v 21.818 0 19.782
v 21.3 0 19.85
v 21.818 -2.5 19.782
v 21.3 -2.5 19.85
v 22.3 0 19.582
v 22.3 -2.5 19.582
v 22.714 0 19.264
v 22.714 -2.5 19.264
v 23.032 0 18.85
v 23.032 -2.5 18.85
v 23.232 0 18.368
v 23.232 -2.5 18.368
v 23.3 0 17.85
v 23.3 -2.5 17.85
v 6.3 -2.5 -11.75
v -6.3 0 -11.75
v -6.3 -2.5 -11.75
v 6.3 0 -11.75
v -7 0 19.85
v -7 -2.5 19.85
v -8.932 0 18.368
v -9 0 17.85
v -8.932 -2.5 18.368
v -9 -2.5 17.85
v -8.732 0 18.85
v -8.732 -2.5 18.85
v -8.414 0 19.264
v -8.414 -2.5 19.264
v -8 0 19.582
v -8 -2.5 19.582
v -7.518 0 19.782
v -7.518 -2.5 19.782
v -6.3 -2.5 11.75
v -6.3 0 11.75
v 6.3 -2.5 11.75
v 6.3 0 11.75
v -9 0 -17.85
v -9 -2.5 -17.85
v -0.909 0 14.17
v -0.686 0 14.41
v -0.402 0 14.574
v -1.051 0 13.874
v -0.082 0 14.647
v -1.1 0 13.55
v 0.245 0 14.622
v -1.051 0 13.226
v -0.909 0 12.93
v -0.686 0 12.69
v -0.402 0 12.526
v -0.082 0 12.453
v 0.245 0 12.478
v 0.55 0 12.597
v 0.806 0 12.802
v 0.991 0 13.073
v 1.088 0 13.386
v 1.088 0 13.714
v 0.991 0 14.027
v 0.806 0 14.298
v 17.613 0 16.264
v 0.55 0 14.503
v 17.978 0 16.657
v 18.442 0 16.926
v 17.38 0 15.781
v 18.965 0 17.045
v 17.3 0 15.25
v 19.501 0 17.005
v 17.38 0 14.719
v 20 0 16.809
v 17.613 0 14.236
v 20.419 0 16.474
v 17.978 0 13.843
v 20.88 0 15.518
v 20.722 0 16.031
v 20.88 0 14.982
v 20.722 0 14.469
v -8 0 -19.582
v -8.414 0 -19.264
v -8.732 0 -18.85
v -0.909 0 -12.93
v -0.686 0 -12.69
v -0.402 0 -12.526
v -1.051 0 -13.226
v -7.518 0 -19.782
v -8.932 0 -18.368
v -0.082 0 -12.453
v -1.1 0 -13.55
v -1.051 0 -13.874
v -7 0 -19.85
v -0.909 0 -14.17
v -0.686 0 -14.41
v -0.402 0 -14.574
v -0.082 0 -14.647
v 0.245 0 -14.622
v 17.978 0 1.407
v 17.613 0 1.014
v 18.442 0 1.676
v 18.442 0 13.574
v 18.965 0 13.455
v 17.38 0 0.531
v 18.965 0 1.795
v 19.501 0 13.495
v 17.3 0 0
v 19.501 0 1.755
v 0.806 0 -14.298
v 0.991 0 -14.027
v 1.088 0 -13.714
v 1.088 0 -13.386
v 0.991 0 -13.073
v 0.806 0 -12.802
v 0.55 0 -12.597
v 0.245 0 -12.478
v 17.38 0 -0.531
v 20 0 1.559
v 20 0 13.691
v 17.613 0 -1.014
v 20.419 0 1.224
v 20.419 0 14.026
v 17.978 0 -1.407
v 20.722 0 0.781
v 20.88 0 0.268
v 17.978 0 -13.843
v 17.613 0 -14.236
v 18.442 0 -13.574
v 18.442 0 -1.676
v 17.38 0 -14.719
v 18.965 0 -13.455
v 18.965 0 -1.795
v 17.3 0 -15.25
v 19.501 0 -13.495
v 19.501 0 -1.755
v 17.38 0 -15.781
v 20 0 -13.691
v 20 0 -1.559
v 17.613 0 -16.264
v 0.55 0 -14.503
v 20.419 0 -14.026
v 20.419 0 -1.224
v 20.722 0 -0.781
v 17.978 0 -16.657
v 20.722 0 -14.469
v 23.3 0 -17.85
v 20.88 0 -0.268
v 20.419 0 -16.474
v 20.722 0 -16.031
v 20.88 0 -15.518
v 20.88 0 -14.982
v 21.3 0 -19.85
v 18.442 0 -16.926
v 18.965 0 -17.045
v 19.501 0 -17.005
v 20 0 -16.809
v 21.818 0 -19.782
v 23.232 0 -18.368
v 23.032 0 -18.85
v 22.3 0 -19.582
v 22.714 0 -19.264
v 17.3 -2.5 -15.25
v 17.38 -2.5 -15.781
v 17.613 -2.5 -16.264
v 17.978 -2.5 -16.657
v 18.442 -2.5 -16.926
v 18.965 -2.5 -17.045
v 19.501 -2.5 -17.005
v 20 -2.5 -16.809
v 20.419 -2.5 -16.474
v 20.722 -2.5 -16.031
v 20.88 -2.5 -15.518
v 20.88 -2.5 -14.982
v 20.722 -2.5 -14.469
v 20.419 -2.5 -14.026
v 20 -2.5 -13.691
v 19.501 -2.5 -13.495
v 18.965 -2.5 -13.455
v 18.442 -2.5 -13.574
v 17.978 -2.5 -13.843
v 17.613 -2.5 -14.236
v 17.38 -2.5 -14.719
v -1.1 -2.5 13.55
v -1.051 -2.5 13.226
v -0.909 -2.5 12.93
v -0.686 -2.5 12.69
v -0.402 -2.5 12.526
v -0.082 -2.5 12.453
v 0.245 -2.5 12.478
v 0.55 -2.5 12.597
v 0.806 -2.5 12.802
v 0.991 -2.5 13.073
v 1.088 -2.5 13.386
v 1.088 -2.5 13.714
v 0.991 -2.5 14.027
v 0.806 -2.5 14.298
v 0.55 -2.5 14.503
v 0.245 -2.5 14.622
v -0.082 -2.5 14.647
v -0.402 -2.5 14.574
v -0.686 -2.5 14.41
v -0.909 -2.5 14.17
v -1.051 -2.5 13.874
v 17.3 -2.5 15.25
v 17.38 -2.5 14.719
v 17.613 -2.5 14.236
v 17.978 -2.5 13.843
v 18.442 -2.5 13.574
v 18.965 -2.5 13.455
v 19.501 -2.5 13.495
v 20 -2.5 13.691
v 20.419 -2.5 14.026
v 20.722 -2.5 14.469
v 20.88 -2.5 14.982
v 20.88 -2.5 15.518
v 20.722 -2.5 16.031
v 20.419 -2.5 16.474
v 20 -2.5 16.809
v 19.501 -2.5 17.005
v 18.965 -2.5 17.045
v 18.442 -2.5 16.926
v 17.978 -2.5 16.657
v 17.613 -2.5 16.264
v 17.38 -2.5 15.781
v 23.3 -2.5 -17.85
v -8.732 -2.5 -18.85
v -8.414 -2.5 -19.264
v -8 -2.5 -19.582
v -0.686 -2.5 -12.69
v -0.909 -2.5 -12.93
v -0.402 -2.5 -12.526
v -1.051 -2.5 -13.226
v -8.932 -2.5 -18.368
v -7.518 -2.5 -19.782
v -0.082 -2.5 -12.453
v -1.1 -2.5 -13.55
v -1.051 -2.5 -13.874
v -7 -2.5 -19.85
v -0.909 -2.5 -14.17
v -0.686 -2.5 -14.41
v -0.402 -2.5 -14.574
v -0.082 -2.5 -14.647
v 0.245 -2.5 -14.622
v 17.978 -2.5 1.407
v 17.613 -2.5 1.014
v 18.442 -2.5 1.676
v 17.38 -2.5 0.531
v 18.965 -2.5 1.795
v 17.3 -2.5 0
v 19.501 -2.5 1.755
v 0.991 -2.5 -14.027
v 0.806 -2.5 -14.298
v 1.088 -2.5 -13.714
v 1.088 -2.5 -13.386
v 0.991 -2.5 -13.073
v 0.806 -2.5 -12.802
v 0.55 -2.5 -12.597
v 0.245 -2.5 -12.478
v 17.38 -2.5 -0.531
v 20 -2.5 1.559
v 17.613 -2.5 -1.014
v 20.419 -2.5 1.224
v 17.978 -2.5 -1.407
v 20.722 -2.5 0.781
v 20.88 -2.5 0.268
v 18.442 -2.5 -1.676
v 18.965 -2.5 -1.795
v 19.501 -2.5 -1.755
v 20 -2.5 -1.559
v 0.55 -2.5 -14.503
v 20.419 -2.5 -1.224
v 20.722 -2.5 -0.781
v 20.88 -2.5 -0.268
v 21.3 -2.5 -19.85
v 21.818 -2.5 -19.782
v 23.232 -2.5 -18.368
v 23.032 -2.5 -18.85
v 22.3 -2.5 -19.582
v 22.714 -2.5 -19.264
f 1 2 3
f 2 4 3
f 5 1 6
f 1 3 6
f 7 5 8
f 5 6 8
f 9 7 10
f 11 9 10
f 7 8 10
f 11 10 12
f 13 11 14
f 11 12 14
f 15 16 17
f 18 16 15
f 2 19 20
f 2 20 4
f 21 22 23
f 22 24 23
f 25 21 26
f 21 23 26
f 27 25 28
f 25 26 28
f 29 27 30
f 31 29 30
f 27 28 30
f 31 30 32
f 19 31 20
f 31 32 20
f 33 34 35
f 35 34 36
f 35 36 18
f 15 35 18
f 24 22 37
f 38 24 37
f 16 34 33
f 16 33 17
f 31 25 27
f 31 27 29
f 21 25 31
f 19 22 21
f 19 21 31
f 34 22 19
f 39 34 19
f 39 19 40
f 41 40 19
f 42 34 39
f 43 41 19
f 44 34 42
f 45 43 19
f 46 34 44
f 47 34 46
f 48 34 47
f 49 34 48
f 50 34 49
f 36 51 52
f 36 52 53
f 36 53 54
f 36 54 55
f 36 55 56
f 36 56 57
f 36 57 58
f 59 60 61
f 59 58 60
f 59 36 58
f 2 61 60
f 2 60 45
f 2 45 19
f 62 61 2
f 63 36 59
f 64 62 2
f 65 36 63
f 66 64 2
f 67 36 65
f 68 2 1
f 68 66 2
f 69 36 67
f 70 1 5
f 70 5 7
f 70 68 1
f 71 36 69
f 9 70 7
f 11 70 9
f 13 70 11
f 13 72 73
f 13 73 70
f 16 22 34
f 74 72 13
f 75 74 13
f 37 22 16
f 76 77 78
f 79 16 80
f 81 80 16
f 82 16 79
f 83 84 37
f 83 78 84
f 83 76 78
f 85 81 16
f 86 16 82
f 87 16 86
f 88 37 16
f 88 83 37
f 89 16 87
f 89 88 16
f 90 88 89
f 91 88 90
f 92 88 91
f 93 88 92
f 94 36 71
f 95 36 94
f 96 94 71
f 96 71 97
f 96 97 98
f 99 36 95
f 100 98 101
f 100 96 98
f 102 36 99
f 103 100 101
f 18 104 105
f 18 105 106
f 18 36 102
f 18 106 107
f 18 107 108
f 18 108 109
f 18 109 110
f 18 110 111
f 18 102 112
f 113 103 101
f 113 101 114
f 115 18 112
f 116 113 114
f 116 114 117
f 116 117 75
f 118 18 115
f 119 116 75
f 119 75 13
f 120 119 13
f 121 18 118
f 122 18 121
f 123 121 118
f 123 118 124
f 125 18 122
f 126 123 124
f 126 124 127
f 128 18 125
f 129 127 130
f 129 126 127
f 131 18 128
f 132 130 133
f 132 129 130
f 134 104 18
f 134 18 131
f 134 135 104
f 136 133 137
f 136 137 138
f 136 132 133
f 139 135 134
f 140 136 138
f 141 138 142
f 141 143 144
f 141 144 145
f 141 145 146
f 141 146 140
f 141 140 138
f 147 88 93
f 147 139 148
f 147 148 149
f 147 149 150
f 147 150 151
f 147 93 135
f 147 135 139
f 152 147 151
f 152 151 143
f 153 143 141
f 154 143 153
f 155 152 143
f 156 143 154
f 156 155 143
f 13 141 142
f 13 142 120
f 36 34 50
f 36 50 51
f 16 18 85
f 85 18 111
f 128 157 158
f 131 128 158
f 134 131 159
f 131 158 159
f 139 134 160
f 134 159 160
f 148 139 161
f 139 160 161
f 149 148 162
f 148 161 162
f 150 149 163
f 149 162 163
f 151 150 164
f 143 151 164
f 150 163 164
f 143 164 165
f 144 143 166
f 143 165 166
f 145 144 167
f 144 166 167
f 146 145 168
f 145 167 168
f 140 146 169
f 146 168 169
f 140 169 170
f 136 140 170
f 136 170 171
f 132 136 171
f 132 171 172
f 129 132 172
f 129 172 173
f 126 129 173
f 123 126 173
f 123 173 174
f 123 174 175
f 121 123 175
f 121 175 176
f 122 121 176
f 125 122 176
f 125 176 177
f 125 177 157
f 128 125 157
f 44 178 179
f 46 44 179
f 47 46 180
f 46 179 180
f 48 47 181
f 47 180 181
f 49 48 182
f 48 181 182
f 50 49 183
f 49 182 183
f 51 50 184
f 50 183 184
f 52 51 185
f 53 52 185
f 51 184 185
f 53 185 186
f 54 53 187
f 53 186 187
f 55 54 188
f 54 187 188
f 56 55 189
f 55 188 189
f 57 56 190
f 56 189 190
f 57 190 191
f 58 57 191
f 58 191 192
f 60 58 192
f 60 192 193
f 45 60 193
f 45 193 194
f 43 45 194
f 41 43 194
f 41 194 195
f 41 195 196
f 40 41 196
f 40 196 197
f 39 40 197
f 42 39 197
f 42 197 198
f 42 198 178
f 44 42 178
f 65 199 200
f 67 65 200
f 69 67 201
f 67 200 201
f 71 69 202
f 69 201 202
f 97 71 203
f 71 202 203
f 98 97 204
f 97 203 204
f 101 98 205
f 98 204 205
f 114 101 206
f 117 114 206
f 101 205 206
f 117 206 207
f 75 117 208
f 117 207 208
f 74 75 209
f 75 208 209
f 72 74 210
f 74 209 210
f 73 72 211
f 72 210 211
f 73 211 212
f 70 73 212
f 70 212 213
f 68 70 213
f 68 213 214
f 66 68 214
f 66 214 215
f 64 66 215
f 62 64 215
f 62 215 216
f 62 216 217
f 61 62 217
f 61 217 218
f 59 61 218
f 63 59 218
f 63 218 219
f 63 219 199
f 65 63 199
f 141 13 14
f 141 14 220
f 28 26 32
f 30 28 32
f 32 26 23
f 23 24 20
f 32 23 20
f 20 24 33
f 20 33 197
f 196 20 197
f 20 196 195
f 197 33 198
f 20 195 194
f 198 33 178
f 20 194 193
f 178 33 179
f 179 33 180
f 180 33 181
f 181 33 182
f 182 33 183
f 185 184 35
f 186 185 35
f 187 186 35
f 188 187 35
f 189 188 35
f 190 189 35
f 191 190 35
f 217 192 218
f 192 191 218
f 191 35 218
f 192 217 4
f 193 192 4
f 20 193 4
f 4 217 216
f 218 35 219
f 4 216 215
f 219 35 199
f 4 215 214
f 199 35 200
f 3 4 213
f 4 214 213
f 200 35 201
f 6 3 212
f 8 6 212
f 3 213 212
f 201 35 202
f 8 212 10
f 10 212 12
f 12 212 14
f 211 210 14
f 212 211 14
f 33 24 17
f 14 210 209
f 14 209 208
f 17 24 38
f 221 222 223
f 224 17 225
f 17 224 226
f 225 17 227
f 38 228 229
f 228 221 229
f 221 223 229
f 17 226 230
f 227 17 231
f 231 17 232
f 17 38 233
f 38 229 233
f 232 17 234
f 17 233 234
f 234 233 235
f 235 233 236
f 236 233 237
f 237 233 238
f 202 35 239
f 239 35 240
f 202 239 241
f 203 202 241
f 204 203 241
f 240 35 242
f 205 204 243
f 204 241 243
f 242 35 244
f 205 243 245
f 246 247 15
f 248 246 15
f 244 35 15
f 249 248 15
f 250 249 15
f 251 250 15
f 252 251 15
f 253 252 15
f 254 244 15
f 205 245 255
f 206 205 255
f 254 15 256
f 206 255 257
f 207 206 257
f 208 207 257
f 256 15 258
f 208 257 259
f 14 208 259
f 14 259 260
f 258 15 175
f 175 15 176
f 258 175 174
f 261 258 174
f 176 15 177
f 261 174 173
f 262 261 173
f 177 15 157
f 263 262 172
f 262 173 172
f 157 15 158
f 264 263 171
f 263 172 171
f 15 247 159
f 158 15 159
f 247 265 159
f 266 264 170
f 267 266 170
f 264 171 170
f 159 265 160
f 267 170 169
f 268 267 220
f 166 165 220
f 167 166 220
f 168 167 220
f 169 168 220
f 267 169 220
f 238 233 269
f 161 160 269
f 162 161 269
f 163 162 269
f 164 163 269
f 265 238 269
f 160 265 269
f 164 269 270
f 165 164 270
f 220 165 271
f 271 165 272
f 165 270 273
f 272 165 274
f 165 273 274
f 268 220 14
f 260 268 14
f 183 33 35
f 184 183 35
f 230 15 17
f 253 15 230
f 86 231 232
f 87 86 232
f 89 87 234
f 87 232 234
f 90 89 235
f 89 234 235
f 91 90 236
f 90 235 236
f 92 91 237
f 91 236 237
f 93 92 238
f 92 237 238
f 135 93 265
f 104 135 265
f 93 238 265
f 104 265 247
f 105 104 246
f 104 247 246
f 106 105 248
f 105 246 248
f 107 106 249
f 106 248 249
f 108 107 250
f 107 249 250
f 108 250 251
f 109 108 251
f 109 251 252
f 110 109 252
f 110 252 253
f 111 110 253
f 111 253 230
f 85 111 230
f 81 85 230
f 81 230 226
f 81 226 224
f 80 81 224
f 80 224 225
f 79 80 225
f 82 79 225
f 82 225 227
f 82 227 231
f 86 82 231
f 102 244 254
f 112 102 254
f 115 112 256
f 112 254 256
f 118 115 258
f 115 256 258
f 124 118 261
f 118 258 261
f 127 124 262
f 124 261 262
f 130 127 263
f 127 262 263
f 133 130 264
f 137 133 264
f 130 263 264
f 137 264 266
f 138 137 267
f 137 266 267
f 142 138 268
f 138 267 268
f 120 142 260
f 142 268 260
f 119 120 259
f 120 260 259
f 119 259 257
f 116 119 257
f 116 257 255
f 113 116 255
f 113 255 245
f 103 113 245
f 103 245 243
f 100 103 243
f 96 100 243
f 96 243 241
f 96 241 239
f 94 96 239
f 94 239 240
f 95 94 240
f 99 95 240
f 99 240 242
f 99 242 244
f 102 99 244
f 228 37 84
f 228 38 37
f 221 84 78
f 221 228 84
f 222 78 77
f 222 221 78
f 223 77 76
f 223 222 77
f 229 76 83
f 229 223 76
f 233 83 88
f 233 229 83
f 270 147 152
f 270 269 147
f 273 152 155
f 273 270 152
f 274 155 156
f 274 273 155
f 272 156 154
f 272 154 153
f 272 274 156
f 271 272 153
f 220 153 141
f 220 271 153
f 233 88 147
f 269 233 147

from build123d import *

# Parameters (mm, degrees)
SKETCH1_W             = 32.299999994
SKETCH1_H             = 39.7
PLATE_SIZE_DEPTH      = 2.5
SKETCH2_W             = 12.6
SKETCH2_H             = 23.5
SERVO_CLEARANCE_DEPTH = 3.5
M2_CLEARANCE_HOLE1_D  = 2.2
M3_CLEARANCE_HOLE1_D  = 3.6
CORNER_FILLET1_R      = 2


with BuildPart() as part:
    # Sketch1 → Plate Size (new body)
    with BuildSketch(Plane(origin=(0, 0, 0), x_dir=(1, 0, 0), z_dir=(0, 1, 0))):
        with Locations((7.149999997, 0)):
            Rectangle(SKETCH1_W, SKETCH1_H)
    extrude(amount=-PLATE_SIZE_DEPTH)

    # Sketch2 → Servo Clearance (cut, through all)
    with BuildSketch(Plane(origin=(0, 0, 0), x_dir=(1, 0, 0), z_dir=(0, 1, 0))):
        Rectangle(SKETCH2_W, SKETCH2_H)
    extrude(amount=-SERVO_CLEARANCE_DEPTH, mode=Mode.SUBTRACT)

    # M2 Clearance Hole1 (through all)
    with Locations(Plane(origin=(0, 0, 0), x_dir=(1, 0, 0), z_dir=(0, 1, 0))):
        with Locations((0, -13.55), (0, 13.55)):
            Hole(M2_CLEARANCE_HOLE1_D / 2)

    # M3 Clearance Hole1 (through all)
    with Locations(Plane(origin=(0, 0, 0), x_dir=(1, 0, 0), z_dir=(0, 1, 0))):
        with Locations((19.099999994, -15.25), (19.099999994, 0), (19.099999994, 15.25)):
            Hole(M3_CLEARANCE_HOLE1_D / 2)

    # Corner Fillet1
    corner_fillet1_edges = [part.edges().sort_by_distance(p)[0] for p in [
        (-9, -1.25, -19.85),
        (23.299999994, -1.25, -19.85),
        (23.299999994, -1.25, 19.85),
        (-9, -1.25, 19.85),
    ]]
    fillet(corner_fillet1_edges, radius=CORNER_FILLET1_R)


solid = part.part
